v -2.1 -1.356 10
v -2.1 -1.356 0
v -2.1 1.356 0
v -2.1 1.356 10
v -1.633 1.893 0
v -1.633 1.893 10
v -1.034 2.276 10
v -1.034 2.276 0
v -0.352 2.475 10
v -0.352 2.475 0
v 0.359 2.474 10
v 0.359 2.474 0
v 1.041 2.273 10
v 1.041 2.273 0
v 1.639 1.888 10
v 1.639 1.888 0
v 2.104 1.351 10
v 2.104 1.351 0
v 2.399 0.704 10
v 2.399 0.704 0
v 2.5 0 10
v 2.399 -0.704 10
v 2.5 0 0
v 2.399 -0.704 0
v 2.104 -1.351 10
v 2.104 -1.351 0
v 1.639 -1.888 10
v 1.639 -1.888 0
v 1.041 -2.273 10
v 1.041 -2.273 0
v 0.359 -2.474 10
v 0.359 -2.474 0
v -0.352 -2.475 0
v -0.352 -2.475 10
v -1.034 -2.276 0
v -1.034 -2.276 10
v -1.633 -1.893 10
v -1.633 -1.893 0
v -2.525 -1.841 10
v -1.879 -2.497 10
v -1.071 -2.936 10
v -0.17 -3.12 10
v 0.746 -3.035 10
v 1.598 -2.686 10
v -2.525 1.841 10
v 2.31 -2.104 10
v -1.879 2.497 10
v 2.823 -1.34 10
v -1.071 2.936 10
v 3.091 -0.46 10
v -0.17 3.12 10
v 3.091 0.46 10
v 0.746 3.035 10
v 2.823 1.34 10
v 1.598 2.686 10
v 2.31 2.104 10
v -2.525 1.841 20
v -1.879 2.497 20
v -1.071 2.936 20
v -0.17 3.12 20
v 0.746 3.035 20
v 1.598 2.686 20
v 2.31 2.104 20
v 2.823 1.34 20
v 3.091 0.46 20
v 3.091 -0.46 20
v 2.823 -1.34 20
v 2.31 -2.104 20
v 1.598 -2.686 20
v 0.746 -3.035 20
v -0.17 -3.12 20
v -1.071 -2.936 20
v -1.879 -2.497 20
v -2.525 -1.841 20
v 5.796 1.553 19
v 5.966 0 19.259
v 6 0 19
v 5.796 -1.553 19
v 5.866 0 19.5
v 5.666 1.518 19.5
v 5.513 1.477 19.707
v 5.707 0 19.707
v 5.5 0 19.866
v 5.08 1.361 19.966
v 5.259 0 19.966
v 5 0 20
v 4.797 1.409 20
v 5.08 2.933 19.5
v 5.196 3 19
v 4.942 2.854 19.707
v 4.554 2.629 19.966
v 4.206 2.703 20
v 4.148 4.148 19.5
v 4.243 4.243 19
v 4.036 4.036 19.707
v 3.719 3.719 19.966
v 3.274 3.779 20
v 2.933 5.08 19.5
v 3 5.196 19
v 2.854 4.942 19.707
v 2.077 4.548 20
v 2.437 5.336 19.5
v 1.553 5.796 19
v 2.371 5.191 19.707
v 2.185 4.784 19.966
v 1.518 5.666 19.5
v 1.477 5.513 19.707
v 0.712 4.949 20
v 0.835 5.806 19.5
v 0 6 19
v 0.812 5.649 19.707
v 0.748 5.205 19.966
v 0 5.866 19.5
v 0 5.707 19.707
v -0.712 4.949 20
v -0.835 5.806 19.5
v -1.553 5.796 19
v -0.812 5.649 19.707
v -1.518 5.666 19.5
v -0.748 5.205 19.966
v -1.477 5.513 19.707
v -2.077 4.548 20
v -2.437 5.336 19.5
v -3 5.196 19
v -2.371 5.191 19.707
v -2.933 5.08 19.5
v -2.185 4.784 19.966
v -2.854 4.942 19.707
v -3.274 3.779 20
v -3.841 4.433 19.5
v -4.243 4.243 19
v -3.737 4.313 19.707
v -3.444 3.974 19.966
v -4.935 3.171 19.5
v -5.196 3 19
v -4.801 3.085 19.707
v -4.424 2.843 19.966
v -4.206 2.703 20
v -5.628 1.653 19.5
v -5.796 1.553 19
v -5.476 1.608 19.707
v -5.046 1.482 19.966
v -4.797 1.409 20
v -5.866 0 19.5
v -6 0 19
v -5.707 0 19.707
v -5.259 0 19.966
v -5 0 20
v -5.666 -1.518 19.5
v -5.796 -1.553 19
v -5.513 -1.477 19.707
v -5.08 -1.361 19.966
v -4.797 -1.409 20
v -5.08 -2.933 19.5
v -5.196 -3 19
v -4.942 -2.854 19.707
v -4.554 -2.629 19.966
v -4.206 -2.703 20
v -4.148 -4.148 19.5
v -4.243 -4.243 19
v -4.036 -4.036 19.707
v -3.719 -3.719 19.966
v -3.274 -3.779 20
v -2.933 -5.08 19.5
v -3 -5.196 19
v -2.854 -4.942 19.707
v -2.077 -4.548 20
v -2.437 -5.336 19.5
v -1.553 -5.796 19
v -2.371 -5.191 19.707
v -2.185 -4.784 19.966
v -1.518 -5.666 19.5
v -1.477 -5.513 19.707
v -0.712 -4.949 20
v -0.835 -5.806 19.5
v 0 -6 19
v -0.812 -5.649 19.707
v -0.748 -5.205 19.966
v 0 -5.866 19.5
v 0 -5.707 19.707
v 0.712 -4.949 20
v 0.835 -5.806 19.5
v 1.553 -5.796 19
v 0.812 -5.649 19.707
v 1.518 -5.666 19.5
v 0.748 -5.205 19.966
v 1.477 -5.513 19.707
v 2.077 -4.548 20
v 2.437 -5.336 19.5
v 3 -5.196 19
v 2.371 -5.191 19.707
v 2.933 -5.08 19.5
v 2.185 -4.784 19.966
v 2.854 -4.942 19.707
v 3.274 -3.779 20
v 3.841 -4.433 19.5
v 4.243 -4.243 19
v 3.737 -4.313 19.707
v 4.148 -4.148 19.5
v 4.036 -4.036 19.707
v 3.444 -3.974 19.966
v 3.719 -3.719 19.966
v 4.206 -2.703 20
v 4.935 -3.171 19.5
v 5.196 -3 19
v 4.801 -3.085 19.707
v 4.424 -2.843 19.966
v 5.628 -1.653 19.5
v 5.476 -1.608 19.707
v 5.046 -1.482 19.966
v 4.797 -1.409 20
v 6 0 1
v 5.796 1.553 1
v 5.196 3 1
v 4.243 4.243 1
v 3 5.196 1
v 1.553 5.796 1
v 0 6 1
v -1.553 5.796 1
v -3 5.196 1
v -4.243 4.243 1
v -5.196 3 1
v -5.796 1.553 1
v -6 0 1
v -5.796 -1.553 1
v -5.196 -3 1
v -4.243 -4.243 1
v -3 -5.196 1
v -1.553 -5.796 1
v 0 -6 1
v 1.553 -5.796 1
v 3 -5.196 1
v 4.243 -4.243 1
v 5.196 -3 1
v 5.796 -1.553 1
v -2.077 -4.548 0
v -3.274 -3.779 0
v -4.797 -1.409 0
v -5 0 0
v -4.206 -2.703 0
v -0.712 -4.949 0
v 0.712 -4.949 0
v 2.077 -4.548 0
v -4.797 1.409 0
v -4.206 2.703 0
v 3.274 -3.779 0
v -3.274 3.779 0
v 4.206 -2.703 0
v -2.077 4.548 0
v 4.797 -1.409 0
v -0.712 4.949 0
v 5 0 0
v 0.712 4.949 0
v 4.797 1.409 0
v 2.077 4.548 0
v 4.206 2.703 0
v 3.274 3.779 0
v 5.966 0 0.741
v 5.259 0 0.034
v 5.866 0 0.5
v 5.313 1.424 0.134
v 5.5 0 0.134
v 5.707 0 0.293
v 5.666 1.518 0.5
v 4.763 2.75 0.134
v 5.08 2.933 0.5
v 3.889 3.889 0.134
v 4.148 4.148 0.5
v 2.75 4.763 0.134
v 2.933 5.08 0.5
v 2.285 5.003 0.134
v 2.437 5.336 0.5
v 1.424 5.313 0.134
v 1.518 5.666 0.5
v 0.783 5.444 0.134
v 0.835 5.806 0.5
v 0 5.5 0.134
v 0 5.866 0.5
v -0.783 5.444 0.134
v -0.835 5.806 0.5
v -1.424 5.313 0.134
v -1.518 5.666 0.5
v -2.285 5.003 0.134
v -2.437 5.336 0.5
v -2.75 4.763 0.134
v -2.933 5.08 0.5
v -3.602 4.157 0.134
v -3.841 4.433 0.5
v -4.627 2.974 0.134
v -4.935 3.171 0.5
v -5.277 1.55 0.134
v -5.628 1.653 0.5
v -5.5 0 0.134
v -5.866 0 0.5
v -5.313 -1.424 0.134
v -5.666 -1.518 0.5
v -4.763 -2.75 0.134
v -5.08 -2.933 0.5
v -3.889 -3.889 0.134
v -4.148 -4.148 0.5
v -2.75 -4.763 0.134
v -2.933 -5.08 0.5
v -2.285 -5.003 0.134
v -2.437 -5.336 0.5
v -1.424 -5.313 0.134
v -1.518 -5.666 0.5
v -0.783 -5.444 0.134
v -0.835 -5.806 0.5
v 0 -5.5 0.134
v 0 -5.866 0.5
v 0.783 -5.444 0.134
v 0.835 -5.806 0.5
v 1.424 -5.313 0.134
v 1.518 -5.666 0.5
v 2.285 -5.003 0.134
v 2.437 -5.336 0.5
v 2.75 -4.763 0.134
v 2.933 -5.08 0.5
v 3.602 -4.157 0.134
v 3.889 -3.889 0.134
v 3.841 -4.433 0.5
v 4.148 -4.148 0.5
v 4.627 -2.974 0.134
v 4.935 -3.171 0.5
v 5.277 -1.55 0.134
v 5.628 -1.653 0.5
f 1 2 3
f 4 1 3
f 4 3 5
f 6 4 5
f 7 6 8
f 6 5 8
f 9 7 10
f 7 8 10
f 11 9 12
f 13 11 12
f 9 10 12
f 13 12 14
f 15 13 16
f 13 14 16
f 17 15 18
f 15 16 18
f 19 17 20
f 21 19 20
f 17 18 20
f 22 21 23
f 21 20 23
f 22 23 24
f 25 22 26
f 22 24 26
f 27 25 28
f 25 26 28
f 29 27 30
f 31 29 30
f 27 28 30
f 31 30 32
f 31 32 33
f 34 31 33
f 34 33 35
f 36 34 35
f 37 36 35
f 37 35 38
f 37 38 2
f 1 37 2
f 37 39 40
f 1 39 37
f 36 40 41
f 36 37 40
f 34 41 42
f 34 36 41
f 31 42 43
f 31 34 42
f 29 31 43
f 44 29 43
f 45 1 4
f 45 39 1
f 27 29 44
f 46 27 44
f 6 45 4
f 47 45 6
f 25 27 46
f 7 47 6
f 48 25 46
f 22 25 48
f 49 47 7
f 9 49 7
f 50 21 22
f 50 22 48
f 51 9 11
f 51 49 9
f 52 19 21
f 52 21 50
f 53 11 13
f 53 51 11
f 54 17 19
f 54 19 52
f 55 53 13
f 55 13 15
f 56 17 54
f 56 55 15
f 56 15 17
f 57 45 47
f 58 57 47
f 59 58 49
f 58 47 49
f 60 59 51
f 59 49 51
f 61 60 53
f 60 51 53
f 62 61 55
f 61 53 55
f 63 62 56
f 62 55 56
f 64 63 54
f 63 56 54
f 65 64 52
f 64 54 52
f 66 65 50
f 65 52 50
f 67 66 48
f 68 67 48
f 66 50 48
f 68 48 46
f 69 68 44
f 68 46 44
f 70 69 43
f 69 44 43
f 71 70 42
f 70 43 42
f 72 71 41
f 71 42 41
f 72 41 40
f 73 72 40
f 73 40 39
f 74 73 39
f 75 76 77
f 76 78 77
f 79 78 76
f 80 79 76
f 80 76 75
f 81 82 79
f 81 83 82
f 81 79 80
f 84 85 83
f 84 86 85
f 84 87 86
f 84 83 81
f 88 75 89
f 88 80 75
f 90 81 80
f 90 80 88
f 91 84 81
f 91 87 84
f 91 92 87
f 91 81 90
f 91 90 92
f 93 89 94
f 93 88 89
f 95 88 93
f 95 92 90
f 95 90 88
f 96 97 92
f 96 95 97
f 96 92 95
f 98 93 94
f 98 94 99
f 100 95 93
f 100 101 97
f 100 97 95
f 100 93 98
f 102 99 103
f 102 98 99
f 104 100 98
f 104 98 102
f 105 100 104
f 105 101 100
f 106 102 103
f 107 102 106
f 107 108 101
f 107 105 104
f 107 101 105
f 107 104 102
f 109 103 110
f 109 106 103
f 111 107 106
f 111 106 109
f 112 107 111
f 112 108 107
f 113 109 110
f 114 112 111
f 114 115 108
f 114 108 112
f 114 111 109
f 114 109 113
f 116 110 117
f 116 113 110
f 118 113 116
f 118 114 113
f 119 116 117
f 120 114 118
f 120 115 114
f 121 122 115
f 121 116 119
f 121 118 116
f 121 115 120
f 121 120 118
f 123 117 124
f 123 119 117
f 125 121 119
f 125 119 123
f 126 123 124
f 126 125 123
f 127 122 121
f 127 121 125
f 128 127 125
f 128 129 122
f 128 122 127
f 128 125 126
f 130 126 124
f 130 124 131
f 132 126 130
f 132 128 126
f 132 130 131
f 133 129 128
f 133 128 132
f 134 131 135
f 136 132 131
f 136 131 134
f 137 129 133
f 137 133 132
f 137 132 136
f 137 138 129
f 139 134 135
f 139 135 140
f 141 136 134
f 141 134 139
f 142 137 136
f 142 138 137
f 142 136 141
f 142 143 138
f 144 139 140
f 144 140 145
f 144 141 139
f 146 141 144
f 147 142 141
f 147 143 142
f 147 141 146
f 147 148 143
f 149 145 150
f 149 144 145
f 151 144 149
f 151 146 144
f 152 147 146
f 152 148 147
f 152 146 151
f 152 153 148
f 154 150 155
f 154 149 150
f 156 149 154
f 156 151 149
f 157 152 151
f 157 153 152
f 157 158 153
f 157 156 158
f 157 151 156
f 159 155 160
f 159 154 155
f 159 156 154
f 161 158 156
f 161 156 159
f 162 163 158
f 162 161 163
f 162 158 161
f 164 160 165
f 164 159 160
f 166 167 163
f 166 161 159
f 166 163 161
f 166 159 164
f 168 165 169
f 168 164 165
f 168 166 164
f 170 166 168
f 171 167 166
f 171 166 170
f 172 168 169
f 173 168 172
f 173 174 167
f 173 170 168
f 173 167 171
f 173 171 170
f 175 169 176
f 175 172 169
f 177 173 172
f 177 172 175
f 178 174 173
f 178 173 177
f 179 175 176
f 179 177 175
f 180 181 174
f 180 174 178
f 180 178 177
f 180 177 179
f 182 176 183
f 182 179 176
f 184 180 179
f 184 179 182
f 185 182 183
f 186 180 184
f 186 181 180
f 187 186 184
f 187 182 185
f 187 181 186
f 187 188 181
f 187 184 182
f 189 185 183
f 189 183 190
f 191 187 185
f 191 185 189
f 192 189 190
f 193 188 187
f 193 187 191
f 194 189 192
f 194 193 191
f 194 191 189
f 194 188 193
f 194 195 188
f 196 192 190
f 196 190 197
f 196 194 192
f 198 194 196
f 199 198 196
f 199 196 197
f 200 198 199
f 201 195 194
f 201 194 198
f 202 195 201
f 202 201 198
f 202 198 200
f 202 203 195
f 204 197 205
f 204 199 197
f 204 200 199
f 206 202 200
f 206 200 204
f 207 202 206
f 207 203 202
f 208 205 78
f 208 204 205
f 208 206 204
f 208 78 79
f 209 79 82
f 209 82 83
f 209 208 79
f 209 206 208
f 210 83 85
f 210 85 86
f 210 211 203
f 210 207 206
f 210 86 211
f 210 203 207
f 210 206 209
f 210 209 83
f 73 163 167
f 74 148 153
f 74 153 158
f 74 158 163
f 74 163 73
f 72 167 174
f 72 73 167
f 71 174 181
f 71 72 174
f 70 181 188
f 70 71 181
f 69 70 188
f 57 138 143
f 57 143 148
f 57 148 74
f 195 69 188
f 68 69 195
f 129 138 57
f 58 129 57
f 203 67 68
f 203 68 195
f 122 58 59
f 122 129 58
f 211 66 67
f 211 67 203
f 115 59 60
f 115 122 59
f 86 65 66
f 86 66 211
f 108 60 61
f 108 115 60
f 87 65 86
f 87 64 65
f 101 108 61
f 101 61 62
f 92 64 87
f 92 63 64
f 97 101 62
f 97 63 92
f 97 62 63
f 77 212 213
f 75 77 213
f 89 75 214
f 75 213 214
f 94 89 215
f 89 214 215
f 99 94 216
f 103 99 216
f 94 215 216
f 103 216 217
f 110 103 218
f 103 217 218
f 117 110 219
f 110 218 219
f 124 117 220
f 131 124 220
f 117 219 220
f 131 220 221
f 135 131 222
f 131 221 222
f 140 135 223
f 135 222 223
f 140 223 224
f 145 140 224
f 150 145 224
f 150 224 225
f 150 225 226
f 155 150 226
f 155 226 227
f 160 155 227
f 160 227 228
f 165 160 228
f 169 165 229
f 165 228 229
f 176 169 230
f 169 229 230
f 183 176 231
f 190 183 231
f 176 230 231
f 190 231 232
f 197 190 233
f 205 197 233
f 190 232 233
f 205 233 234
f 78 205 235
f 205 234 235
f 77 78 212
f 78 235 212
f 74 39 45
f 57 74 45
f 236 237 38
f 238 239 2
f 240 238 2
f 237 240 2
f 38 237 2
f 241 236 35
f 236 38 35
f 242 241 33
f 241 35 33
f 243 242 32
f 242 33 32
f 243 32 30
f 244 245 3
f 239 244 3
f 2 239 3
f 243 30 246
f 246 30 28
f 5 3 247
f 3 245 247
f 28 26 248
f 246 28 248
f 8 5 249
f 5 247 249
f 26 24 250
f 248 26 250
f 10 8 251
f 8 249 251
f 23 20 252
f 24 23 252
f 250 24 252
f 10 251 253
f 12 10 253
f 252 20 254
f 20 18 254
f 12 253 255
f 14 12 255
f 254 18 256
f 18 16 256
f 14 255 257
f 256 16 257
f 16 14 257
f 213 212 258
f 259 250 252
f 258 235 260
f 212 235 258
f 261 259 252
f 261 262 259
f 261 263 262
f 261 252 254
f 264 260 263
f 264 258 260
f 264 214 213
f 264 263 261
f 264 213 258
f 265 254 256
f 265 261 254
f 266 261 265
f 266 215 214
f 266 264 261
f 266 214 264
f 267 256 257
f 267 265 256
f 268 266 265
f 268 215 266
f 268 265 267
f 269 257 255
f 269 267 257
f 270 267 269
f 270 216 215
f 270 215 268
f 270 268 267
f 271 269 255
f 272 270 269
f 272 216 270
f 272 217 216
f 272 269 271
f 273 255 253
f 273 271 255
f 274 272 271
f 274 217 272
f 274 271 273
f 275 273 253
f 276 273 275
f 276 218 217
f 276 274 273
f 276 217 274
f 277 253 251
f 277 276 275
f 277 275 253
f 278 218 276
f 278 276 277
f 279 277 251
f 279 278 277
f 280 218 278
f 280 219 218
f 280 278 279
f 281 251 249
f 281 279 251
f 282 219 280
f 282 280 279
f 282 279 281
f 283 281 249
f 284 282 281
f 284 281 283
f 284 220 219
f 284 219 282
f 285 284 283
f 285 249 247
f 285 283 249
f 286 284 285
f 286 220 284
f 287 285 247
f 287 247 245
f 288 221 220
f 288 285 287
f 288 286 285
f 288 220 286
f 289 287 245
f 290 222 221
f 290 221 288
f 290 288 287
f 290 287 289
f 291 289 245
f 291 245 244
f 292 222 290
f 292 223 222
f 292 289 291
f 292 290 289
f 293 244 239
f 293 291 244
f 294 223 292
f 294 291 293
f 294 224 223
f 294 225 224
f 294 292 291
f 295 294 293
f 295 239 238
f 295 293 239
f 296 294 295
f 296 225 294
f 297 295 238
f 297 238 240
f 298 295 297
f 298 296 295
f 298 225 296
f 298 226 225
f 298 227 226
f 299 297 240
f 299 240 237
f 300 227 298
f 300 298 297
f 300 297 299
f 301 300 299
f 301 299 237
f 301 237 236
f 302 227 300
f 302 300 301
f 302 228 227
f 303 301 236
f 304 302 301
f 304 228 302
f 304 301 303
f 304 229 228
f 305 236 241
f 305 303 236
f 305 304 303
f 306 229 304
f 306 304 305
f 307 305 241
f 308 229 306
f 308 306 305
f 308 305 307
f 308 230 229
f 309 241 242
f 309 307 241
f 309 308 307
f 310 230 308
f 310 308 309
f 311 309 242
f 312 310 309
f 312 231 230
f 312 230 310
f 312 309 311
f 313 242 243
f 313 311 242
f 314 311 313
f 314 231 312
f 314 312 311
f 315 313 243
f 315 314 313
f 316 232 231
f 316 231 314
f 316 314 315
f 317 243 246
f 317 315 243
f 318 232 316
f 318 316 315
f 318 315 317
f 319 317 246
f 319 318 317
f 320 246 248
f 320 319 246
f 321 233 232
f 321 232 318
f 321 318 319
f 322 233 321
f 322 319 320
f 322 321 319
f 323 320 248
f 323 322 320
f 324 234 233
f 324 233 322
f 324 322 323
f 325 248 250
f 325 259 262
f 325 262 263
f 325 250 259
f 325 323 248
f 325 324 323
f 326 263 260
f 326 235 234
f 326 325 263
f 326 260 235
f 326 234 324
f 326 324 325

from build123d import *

# Parameters (mm, degrees)
F0_R     = 6
F1_DEPTH = 20
F2_DEPTH = 10
F4_DEPTH = 25
F5_R     = 1


with BuildPart() as f1:
    # F0 (on Top) → F1 (new body)
    with BuildSketch(Plane.XY):
        Circle(F0_R)
        with BuildLine():
            ThreePointArc((-2.525, 1.841195), (3.125, 0), (-2.525, -1.841195))
            Line((-2.525, -1.841195), (-2.525, 1.841195))
        make_face(mode=Mode.SUBTRACT)
    extrude(amount=F1_DEPTH)

    # F0 (on Top) → F2 (join)
    with BuildSketch(Plane.XY):
        with BuildLine():
            Line((-2.525, 1.841195), (-2.525, -1.841195))
            ThreePointArc((-2.525, -1.841195), (3.125, 0), (-2.525, 1.841195))
        make_face()
    extrude(amount=F2_DEPTH)

    # F3 (on face) → F4 (cut)
    with BuildSketch(Plane(origin=(0, 0, 0), x_dir=(1, 0, 0), z_dir=(0, 0, -1))):
        with BuildLine():
            Line((-2.1, 1.356466), (-2.1, -1.356466))
            ThreePointArc((-2.1, -1.356466), (2.5, 0), (-2.1, 1.356466))
        make_face()
    extrude(amount=-F4_DEPTH, mode=Mode.SUBTRACT)

    # F5
    f5_edges = [f1.edges().sort_by_distance(p)[0] for p in [
        (-6, 0, 20),
        (-6, 0, 0),
    ]]
    fillet(f5_edges, radius=F5_R)


solid = f1.part
